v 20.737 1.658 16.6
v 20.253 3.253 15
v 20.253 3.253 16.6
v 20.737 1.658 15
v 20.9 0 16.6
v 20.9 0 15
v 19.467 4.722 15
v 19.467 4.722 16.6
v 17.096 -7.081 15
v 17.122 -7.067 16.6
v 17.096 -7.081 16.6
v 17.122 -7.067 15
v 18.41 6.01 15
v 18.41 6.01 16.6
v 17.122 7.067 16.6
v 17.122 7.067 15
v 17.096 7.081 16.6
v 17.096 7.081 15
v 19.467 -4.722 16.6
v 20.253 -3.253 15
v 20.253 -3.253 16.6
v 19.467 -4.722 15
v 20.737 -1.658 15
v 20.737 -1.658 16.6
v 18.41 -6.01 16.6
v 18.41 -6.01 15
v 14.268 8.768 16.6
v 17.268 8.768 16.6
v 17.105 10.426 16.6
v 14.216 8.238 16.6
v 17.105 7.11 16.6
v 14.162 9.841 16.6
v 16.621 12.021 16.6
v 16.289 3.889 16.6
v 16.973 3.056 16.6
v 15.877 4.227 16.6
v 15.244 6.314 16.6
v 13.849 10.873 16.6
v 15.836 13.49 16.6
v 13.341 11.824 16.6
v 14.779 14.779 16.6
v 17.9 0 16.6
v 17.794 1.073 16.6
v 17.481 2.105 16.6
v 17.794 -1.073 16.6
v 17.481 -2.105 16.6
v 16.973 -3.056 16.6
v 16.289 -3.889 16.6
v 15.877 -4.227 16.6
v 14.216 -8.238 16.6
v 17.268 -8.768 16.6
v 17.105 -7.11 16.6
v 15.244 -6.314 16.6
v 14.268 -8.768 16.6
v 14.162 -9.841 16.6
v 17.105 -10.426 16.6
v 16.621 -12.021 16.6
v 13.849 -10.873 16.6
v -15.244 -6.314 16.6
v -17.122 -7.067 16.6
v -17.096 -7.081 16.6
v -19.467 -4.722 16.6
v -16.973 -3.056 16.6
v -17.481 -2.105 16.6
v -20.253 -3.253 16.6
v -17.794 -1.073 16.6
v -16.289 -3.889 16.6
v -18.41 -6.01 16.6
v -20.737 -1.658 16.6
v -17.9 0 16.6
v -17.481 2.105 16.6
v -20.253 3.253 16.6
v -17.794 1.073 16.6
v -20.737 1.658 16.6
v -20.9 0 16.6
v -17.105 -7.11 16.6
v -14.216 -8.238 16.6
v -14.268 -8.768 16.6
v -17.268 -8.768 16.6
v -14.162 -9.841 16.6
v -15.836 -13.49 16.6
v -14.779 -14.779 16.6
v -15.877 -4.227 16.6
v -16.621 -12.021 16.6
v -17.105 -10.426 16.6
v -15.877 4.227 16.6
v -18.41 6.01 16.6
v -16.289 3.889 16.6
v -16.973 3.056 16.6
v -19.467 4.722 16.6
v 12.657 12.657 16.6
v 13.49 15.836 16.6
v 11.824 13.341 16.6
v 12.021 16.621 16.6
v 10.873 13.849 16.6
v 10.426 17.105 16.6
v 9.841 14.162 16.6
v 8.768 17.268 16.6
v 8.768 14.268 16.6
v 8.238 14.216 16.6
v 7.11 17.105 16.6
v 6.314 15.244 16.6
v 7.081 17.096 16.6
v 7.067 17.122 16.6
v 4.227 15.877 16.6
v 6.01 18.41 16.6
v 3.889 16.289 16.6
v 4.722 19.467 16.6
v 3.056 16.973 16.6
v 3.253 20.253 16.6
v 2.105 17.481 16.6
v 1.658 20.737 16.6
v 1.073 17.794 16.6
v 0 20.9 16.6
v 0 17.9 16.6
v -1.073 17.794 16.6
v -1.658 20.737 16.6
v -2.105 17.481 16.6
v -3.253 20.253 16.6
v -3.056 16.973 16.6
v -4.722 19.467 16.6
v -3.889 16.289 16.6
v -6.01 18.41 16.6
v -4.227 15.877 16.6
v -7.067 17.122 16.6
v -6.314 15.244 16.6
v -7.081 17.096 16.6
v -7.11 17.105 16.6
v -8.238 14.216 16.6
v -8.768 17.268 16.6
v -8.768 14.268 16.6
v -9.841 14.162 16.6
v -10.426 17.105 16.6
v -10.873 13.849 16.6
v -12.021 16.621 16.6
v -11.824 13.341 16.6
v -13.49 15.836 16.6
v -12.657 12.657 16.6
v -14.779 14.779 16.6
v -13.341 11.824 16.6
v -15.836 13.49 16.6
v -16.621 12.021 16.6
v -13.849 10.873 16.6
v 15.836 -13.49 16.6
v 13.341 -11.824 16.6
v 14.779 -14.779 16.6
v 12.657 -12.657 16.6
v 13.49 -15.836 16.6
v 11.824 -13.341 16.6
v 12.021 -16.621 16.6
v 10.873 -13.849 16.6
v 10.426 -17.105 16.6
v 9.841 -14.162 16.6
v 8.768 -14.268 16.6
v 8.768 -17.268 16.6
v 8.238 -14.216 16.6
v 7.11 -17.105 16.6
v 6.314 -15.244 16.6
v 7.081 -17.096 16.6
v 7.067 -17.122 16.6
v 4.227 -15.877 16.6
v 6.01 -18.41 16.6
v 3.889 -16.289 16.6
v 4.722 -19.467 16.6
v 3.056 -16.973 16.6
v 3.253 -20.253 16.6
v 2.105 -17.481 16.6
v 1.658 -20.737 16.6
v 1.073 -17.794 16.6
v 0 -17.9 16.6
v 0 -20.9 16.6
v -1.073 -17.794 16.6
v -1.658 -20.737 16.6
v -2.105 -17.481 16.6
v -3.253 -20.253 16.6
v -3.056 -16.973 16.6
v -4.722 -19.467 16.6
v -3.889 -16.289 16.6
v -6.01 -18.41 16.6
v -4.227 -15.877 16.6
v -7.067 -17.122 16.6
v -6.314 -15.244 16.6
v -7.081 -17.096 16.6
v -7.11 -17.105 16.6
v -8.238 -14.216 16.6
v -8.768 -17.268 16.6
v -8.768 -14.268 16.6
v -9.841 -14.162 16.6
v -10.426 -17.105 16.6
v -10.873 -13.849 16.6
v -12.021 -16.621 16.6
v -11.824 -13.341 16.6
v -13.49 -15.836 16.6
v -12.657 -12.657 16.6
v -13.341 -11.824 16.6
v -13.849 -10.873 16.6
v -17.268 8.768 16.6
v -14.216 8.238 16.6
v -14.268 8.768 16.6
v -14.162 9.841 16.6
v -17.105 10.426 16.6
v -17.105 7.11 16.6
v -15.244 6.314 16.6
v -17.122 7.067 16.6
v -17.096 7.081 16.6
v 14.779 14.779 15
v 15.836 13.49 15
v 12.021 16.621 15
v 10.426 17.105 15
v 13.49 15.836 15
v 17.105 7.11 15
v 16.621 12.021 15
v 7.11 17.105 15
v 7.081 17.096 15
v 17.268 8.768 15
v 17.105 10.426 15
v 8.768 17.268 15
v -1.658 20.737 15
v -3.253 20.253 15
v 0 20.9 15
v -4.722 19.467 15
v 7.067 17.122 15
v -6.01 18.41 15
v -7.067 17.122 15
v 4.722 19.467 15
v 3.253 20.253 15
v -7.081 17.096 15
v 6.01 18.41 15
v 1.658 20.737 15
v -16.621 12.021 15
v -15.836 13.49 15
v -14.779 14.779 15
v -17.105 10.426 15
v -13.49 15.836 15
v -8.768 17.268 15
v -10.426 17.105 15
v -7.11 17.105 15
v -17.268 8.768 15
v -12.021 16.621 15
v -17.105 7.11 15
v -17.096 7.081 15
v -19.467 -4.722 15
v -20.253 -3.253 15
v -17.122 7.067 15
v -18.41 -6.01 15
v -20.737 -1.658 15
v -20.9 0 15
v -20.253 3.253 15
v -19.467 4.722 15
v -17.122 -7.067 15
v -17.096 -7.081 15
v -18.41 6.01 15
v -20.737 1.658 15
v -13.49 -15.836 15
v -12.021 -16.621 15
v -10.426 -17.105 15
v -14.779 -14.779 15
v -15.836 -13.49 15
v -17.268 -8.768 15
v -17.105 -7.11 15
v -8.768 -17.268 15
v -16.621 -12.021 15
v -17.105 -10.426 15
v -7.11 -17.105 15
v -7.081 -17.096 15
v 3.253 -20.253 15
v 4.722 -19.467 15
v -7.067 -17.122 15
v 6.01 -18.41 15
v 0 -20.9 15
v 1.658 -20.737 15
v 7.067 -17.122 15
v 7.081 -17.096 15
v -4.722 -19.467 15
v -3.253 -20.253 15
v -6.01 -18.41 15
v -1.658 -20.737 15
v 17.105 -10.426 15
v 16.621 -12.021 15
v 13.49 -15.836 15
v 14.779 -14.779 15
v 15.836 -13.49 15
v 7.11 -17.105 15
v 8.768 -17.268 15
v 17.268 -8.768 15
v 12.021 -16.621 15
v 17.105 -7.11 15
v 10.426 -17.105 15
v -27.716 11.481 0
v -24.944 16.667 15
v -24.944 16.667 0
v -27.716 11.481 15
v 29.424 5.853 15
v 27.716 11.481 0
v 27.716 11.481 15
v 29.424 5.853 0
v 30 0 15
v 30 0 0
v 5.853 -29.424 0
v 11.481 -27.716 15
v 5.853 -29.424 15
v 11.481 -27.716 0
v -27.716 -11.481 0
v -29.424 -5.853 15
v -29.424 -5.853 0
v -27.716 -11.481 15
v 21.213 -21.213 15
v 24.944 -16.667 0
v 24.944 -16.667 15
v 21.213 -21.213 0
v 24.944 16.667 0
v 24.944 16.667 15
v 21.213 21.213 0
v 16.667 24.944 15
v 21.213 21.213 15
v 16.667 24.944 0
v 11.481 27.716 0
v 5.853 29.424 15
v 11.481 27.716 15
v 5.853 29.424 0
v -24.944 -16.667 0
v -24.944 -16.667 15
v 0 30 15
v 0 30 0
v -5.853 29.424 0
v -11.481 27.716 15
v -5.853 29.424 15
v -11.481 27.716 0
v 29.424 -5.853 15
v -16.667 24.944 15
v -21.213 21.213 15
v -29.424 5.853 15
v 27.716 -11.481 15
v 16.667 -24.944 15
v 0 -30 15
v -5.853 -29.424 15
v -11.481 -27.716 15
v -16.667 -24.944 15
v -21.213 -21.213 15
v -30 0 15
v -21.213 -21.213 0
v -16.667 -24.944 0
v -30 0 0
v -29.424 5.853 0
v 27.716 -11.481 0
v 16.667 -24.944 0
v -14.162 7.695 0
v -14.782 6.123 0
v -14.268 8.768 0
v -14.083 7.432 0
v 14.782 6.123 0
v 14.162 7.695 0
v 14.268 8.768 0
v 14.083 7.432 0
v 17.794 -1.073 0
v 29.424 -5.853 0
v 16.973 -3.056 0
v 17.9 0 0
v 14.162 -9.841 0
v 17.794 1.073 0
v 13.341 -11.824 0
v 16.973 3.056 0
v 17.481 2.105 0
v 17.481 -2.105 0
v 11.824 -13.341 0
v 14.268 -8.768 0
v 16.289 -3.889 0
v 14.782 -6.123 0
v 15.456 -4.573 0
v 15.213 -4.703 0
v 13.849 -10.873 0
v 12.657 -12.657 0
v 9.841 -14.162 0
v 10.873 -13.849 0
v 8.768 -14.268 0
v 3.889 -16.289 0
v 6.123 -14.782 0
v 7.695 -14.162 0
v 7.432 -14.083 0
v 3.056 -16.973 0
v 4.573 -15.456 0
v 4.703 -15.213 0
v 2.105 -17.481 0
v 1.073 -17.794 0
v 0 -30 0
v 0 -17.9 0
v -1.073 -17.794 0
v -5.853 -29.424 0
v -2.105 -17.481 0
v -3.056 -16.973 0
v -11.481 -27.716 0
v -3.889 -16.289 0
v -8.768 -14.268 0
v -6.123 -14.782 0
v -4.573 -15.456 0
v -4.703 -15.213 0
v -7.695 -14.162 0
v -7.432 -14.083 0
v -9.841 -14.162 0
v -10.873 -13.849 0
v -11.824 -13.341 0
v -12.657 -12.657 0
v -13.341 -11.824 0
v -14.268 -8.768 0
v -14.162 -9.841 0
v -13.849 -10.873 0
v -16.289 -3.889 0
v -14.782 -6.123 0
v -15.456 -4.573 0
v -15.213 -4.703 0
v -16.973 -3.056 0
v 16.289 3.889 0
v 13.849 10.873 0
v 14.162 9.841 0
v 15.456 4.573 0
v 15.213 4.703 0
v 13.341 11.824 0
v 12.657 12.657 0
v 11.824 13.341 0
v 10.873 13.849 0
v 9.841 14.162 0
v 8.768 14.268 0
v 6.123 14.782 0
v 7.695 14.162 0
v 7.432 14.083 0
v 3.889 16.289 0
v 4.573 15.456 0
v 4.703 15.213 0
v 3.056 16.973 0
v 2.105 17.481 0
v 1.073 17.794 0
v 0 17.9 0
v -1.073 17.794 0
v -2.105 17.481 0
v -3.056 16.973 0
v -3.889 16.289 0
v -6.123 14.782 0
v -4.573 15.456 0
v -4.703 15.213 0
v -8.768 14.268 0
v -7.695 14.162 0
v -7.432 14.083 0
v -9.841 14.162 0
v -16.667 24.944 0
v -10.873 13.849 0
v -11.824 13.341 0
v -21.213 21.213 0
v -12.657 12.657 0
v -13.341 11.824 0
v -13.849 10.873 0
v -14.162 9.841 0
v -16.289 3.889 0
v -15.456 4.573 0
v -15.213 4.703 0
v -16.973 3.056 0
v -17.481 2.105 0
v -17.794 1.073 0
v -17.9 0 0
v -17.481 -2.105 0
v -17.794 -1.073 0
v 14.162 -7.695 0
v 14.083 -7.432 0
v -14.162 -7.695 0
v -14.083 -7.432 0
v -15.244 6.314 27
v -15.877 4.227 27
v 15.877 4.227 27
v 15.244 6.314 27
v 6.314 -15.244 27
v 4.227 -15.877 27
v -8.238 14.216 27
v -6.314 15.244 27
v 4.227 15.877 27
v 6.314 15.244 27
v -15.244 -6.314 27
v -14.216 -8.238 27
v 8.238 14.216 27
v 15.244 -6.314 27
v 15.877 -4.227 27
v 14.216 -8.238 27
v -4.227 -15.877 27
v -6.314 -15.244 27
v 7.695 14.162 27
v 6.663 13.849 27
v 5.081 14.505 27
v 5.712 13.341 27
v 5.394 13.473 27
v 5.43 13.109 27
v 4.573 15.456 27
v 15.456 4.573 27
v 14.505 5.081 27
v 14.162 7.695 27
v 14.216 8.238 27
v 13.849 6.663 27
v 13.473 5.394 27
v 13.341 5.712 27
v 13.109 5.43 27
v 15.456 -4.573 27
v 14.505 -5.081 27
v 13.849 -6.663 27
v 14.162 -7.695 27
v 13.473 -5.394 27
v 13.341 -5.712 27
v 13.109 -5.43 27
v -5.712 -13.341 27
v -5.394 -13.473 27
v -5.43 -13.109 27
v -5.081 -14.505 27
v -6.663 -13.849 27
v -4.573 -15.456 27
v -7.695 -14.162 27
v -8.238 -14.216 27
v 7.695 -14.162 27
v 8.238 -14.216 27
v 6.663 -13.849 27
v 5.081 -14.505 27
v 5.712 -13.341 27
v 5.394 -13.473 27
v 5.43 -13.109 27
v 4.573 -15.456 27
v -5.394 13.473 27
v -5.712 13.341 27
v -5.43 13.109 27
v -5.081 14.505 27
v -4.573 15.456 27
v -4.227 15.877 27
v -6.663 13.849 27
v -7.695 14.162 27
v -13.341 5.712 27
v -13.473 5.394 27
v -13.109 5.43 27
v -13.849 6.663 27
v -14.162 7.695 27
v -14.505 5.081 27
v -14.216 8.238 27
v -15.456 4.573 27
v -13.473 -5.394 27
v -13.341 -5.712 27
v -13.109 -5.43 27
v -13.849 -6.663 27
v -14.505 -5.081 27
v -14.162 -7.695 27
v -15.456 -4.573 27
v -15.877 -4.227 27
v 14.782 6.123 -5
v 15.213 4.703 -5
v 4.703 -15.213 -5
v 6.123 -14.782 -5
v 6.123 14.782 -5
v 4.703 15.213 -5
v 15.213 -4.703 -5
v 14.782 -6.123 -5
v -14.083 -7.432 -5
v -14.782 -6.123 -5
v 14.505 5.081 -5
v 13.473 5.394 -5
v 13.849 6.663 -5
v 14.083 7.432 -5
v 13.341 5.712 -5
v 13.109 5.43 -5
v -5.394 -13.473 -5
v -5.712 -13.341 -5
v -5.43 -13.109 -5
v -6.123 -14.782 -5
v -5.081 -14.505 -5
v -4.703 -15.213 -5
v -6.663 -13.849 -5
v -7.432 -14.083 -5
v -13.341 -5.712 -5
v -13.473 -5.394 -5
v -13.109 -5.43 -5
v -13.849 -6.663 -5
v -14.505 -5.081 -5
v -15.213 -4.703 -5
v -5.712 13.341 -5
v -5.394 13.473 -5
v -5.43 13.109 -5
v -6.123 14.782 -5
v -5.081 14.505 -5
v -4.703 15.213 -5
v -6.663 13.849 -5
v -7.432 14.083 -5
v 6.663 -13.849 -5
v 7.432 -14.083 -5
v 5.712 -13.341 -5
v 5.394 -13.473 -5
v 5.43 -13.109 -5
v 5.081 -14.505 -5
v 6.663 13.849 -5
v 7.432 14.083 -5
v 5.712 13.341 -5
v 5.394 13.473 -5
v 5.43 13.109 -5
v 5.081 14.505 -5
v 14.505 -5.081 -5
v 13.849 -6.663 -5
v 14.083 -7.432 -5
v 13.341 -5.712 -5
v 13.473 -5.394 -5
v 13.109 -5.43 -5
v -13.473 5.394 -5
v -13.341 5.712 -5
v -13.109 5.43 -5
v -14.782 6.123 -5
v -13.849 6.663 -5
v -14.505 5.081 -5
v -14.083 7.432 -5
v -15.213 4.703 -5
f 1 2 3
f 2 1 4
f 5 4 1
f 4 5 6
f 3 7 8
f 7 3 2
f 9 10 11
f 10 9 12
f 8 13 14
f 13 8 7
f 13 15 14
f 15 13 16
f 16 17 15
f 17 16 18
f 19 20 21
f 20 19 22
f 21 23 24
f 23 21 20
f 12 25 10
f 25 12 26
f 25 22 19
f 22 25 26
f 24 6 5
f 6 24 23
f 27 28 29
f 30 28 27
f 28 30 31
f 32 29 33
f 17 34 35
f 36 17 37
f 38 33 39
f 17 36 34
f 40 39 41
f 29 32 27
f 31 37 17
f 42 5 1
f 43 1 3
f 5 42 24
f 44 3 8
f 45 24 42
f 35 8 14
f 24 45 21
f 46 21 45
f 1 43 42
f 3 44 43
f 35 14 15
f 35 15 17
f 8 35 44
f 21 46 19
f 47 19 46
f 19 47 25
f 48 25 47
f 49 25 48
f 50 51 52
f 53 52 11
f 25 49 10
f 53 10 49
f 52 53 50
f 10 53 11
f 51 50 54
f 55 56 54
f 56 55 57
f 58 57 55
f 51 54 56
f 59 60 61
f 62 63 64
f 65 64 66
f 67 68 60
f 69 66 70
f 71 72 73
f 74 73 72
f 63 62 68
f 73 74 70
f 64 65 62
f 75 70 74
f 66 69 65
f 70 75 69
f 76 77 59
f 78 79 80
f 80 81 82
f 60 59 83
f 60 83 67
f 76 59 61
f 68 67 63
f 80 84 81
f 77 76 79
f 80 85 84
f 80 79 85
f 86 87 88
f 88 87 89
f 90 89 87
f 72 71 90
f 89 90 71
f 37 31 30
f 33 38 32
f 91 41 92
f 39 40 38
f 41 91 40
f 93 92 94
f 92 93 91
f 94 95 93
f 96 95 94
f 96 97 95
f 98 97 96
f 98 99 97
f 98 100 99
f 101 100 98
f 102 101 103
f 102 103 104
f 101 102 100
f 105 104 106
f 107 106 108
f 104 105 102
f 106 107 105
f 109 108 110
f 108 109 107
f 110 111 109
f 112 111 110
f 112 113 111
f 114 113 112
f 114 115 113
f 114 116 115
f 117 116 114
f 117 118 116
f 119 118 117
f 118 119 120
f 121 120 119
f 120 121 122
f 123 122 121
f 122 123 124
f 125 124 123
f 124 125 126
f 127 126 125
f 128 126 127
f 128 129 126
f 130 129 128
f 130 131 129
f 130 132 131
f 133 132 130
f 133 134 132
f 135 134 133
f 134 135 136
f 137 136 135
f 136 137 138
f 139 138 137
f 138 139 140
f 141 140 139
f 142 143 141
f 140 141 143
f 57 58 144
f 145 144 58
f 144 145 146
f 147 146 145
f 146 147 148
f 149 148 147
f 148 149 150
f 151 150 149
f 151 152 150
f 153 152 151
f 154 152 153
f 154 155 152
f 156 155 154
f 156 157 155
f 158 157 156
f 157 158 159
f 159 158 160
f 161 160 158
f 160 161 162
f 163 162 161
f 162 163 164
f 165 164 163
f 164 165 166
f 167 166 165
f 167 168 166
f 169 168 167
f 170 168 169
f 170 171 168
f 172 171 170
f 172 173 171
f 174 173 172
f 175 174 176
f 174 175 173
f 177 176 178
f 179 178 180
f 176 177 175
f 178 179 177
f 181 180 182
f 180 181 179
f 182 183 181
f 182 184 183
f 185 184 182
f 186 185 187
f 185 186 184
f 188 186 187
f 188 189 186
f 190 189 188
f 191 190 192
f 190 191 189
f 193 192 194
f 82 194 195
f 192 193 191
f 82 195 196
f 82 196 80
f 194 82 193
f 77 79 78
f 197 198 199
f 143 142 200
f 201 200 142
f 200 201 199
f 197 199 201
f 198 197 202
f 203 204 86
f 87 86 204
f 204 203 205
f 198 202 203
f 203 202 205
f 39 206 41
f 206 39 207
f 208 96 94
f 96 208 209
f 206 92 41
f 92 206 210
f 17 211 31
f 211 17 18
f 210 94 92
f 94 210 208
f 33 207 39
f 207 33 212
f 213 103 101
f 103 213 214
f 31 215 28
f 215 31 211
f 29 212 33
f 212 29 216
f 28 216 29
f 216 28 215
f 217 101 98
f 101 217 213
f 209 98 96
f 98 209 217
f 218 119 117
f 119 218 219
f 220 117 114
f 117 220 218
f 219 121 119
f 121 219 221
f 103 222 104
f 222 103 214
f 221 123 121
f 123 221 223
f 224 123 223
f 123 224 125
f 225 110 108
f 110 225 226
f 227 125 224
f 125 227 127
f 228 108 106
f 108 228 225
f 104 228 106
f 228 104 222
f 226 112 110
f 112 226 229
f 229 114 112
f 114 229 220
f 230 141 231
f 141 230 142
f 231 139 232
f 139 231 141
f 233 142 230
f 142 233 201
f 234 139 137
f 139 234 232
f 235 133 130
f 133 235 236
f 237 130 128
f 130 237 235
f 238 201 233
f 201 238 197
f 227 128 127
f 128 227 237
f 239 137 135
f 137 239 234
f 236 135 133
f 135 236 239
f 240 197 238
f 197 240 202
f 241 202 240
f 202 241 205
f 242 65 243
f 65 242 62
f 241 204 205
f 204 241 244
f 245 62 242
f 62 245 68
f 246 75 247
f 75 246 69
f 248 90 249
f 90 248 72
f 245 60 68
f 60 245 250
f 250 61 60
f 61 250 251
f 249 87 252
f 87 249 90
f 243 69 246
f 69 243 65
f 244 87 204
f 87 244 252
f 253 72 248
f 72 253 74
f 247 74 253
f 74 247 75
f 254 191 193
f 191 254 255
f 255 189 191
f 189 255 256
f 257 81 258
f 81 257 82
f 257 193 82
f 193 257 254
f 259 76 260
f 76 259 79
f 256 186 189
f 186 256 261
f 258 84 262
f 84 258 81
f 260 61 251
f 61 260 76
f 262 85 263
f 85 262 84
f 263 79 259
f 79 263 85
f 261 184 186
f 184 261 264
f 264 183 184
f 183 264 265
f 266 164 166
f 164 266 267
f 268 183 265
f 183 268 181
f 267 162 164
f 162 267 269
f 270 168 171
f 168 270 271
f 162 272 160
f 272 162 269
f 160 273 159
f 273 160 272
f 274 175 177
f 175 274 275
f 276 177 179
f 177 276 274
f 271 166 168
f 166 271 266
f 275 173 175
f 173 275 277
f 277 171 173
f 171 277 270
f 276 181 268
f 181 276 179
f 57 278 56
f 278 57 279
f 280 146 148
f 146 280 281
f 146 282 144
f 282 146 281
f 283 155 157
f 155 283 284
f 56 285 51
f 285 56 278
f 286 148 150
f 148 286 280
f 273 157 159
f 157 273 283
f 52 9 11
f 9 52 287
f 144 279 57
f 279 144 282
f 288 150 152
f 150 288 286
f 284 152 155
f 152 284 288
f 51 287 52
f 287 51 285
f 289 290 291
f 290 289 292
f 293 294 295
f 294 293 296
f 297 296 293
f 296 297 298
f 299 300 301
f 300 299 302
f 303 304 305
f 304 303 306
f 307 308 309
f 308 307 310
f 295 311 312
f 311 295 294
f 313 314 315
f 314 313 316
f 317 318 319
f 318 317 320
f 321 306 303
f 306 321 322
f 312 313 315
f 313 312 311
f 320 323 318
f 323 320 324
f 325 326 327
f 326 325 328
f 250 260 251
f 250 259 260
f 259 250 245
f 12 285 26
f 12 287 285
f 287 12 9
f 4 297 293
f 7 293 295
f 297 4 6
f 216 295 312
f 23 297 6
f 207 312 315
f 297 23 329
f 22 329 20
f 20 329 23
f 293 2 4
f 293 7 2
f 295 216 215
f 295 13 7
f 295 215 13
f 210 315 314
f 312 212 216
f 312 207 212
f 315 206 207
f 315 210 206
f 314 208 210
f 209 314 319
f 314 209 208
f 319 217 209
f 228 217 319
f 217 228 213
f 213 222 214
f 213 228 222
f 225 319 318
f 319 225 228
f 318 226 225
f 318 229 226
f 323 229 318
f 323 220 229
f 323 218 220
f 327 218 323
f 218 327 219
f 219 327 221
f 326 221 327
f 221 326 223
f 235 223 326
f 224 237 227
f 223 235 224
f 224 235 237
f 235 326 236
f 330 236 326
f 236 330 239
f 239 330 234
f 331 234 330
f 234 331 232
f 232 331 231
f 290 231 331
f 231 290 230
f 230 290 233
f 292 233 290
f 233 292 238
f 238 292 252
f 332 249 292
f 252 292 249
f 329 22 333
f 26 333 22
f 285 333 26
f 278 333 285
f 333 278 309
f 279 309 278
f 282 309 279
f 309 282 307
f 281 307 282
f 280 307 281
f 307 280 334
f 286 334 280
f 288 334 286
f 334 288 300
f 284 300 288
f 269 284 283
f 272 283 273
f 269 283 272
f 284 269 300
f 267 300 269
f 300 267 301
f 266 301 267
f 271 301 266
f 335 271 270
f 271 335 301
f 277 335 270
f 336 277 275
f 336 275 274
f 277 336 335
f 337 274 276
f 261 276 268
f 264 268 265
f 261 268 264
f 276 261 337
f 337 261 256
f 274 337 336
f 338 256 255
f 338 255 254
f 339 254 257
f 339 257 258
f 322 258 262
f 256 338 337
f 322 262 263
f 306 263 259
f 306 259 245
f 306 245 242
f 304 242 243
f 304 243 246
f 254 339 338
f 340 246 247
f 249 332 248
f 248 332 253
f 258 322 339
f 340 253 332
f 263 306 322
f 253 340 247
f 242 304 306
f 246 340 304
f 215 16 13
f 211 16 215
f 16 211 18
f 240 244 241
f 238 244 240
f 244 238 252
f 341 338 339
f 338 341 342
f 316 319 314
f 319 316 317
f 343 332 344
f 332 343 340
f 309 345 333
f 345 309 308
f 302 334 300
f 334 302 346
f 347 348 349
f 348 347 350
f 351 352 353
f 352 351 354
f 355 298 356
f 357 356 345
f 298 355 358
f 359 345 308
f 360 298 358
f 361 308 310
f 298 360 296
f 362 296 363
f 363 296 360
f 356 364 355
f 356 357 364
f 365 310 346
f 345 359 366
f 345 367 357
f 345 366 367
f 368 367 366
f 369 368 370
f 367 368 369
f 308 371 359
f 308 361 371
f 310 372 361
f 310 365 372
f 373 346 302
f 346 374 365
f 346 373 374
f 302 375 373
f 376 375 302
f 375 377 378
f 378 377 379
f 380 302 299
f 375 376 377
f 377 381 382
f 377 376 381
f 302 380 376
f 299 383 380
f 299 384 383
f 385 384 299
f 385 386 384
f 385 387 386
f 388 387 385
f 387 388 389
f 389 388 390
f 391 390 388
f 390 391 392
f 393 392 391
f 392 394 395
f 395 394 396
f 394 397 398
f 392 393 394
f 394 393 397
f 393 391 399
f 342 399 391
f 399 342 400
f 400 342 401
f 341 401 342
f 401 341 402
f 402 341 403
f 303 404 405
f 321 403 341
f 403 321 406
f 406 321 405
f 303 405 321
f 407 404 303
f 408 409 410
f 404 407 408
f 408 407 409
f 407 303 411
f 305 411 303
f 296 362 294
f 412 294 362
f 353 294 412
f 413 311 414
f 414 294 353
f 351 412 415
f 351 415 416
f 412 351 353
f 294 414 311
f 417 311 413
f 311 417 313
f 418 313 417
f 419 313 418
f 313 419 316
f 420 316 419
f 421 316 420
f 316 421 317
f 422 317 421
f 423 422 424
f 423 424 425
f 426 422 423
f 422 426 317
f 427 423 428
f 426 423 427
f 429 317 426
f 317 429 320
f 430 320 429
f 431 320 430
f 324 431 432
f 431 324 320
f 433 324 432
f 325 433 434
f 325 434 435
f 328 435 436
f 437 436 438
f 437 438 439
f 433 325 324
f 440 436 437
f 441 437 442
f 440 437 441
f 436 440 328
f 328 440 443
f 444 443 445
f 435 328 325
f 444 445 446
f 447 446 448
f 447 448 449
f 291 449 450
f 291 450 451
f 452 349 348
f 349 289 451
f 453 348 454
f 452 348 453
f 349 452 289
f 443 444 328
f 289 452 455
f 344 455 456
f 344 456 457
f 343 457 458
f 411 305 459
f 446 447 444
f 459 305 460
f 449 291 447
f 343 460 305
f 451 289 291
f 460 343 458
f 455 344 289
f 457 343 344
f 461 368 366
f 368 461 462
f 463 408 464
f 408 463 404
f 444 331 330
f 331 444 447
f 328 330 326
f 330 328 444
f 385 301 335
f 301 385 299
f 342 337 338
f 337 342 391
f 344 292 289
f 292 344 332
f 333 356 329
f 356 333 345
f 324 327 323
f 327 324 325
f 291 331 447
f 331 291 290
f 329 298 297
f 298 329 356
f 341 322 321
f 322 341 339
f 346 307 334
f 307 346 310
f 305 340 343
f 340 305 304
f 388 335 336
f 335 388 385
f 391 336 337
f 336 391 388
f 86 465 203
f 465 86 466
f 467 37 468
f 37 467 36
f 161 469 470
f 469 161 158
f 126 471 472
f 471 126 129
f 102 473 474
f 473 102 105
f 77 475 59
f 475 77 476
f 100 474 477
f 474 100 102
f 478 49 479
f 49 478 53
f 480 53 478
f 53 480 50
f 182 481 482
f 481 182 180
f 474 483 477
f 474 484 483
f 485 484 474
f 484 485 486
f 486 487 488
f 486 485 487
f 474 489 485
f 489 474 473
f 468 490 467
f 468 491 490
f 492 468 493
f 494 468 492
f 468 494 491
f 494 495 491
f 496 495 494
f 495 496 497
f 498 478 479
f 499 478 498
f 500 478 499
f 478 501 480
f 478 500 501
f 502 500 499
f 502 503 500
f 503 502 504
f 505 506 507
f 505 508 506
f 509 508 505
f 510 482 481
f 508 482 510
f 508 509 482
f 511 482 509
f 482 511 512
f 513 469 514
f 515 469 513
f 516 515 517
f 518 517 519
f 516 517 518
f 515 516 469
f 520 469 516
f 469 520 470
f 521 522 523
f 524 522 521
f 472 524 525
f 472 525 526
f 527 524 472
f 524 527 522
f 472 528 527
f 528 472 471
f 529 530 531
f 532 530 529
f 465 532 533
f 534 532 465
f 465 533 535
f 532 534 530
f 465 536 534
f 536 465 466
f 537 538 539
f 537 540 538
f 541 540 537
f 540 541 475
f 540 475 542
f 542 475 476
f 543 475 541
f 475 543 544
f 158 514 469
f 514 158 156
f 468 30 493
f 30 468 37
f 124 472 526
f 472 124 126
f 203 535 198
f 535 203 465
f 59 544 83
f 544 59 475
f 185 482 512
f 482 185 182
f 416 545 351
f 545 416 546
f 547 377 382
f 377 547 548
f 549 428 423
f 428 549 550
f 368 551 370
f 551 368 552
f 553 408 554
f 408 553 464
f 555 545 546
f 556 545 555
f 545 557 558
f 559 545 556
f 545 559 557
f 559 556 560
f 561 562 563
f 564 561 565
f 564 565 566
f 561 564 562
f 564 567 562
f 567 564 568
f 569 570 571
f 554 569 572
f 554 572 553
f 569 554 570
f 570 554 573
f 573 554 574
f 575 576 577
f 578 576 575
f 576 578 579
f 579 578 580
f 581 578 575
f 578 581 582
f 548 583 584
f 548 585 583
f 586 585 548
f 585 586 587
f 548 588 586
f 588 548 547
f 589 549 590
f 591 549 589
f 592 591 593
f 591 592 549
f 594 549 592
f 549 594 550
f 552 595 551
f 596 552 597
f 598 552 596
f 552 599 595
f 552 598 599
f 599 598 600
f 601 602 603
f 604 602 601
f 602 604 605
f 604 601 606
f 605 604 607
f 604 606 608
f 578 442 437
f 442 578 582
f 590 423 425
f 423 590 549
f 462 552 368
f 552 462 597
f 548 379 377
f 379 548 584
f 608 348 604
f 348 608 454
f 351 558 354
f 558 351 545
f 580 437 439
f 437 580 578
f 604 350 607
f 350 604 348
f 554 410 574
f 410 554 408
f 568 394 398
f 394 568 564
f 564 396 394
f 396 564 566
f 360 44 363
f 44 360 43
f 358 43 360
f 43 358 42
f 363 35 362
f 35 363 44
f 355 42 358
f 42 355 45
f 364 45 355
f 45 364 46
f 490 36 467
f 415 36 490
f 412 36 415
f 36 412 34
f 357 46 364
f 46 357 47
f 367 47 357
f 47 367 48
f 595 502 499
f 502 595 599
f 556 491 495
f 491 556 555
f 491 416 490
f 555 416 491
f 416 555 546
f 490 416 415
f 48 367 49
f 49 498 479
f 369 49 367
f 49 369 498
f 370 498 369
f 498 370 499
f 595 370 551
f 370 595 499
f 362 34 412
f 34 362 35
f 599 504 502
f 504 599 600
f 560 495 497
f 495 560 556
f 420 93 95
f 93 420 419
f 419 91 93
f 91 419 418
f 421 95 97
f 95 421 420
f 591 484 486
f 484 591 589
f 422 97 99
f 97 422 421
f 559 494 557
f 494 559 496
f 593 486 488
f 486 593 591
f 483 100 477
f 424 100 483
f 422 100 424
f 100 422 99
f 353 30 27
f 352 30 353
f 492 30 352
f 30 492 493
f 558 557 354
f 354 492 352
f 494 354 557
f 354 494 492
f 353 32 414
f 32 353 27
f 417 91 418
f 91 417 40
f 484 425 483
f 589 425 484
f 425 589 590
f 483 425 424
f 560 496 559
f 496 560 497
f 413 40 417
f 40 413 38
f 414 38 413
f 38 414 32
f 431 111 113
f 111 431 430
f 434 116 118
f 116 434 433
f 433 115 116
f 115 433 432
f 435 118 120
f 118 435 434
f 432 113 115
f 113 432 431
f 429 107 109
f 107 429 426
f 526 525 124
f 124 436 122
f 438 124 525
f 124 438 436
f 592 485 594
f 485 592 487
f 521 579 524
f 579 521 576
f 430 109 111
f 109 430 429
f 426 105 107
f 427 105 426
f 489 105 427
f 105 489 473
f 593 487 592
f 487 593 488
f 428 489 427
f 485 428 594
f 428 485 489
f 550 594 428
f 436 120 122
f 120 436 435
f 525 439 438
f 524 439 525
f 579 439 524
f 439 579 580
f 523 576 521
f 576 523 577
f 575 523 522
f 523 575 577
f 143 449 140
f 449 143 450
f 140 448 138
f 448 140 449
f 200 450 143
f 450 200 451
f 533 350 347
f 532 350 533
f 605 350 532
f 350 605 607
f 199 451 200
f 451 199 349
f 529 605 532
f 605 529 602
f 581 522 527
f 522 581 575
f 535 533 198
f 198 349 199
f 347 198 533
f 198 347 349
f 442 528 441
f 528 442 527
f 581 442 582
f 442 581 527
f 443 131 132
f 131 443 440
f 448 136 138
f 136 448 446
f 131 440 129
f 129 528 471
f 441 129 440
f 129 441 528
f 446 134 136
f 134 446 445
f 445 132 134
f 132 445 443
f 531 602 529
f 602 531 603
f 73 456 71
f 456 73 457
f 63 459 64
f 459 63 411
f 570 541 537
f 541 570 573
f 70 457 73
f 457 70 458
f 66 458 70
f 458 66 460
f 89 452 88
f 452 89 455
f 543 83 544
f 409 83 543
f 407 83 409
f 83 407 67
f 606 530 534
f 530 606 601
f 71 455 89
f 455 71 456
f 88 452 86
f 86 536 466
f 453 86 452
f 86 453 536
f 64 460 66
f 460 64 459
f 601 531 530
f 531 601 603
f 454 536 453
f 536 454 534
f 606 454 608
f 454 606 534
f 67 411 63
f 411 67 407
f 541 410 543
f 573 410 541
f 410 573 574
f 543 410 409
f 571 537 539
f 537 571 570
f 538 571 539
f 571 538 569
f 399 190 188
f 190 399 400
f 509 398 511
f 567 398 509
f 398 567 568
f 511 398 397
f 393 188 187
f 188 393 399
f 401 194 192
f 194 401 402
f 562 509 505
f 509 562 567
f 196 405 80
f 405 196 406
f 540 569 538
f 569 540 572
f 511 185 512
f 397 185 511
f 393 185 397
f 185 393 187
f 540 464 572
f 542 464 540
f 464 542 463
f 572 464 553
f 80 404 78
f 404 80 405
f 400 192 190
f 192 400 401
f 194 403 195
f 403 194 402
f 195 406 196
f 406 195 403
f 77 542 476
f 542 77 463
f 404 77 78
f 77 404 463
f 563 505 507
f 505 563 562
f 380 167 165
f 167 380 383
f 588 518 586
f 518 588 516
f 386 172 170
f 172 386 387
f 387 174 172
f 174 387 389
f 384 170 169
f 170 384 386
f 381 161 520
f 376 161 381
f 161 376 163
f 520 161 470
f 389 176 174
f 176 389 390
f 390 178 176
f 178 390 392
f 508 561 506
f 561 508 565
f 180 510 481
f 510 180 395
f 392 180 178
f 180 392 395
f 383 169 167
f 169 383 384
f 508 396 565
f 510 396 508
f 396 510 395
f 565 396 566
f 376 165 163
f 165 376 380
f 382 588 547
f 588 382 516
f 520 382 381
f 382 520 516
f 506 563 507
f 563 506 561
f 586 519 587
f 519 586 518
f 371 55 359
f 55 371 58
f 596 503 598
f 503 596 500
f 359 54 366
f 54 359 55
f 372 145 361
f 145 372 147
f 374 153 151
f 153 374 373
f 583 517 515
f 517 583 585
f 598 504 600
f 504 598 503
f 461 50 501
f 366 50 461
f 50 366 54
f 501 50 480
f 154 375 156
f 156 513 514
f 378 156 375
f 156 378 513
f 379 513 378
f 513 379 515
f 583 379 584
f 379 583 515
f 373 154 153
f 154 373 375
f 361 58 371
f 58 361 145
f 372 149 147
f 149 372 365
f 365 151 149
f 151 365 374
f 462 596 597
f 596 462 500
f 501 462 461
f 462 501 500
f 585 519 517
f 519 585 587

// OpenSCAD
$fn = 32;

// ----------------------------------------------------------------------
// Bolt-circle flange: 60 mm outside, 8 bolt holes, bore 20 mm
// ----------------------------------------------------------------------

// --- parameters (mm) ---
flange_d = 60;            // flange outside diameter
flange_t = 15;            // flange thickness
bolts = 8;                // number of bolt holes
bolt_d = 11;              // bolt clearance
bolt_r = 12.4;            // bolt circle radius
bore_d = 20;              // centre bore
hub_d = 33;               // raised hub diameter
hub_h = 12;               // raised hub height
spigot_d = 32;            // spigot diameter
spigot_h = 6;             // spigot height below the flange
sink = 1;                 // overlap into the flange
spot_d = 17;              // spot faced bosses
spot_h = 1.6;             // spot face height

module body() {
  cylinder(h = flange_t, d = flange_d);
  /* raised hub, sunk 1 mm into the flange */
  translate([0, 0, flange_t - 1]) cylinder(h = hub_h + 1, d = hub_d);
  /* spigot on the back face, sunk into the flange */
  translate([0, 0, -spigot_h + sink]) cylinder(h = spigot_h, d = spigot_d);
  /* spot faced pads under the bolt heads */
  for (i = [0 : bolts - 1]) rotate([0, 0, i * 360 / bolts]) translate([bolt_r, 0, flange_t - 1]) cylinder(h = spot_h + 1, d = spot_d);
}

difference() {
  body();
  /* bolt circle */
  for (i = [0 : bolts - 1]) rotate([0, 0, i * 360 / bolts]) translate([bolt_r, 0, -spigot_h - 1]) cylinder(h = flange_t + hub_h + spigot_h + 3, d = bolt_d);
  translate([0, 0, -spigot_h - 1]) cylinder(h = flange_t + hub_h + spigot_h + 3, d = bore_d);
}
